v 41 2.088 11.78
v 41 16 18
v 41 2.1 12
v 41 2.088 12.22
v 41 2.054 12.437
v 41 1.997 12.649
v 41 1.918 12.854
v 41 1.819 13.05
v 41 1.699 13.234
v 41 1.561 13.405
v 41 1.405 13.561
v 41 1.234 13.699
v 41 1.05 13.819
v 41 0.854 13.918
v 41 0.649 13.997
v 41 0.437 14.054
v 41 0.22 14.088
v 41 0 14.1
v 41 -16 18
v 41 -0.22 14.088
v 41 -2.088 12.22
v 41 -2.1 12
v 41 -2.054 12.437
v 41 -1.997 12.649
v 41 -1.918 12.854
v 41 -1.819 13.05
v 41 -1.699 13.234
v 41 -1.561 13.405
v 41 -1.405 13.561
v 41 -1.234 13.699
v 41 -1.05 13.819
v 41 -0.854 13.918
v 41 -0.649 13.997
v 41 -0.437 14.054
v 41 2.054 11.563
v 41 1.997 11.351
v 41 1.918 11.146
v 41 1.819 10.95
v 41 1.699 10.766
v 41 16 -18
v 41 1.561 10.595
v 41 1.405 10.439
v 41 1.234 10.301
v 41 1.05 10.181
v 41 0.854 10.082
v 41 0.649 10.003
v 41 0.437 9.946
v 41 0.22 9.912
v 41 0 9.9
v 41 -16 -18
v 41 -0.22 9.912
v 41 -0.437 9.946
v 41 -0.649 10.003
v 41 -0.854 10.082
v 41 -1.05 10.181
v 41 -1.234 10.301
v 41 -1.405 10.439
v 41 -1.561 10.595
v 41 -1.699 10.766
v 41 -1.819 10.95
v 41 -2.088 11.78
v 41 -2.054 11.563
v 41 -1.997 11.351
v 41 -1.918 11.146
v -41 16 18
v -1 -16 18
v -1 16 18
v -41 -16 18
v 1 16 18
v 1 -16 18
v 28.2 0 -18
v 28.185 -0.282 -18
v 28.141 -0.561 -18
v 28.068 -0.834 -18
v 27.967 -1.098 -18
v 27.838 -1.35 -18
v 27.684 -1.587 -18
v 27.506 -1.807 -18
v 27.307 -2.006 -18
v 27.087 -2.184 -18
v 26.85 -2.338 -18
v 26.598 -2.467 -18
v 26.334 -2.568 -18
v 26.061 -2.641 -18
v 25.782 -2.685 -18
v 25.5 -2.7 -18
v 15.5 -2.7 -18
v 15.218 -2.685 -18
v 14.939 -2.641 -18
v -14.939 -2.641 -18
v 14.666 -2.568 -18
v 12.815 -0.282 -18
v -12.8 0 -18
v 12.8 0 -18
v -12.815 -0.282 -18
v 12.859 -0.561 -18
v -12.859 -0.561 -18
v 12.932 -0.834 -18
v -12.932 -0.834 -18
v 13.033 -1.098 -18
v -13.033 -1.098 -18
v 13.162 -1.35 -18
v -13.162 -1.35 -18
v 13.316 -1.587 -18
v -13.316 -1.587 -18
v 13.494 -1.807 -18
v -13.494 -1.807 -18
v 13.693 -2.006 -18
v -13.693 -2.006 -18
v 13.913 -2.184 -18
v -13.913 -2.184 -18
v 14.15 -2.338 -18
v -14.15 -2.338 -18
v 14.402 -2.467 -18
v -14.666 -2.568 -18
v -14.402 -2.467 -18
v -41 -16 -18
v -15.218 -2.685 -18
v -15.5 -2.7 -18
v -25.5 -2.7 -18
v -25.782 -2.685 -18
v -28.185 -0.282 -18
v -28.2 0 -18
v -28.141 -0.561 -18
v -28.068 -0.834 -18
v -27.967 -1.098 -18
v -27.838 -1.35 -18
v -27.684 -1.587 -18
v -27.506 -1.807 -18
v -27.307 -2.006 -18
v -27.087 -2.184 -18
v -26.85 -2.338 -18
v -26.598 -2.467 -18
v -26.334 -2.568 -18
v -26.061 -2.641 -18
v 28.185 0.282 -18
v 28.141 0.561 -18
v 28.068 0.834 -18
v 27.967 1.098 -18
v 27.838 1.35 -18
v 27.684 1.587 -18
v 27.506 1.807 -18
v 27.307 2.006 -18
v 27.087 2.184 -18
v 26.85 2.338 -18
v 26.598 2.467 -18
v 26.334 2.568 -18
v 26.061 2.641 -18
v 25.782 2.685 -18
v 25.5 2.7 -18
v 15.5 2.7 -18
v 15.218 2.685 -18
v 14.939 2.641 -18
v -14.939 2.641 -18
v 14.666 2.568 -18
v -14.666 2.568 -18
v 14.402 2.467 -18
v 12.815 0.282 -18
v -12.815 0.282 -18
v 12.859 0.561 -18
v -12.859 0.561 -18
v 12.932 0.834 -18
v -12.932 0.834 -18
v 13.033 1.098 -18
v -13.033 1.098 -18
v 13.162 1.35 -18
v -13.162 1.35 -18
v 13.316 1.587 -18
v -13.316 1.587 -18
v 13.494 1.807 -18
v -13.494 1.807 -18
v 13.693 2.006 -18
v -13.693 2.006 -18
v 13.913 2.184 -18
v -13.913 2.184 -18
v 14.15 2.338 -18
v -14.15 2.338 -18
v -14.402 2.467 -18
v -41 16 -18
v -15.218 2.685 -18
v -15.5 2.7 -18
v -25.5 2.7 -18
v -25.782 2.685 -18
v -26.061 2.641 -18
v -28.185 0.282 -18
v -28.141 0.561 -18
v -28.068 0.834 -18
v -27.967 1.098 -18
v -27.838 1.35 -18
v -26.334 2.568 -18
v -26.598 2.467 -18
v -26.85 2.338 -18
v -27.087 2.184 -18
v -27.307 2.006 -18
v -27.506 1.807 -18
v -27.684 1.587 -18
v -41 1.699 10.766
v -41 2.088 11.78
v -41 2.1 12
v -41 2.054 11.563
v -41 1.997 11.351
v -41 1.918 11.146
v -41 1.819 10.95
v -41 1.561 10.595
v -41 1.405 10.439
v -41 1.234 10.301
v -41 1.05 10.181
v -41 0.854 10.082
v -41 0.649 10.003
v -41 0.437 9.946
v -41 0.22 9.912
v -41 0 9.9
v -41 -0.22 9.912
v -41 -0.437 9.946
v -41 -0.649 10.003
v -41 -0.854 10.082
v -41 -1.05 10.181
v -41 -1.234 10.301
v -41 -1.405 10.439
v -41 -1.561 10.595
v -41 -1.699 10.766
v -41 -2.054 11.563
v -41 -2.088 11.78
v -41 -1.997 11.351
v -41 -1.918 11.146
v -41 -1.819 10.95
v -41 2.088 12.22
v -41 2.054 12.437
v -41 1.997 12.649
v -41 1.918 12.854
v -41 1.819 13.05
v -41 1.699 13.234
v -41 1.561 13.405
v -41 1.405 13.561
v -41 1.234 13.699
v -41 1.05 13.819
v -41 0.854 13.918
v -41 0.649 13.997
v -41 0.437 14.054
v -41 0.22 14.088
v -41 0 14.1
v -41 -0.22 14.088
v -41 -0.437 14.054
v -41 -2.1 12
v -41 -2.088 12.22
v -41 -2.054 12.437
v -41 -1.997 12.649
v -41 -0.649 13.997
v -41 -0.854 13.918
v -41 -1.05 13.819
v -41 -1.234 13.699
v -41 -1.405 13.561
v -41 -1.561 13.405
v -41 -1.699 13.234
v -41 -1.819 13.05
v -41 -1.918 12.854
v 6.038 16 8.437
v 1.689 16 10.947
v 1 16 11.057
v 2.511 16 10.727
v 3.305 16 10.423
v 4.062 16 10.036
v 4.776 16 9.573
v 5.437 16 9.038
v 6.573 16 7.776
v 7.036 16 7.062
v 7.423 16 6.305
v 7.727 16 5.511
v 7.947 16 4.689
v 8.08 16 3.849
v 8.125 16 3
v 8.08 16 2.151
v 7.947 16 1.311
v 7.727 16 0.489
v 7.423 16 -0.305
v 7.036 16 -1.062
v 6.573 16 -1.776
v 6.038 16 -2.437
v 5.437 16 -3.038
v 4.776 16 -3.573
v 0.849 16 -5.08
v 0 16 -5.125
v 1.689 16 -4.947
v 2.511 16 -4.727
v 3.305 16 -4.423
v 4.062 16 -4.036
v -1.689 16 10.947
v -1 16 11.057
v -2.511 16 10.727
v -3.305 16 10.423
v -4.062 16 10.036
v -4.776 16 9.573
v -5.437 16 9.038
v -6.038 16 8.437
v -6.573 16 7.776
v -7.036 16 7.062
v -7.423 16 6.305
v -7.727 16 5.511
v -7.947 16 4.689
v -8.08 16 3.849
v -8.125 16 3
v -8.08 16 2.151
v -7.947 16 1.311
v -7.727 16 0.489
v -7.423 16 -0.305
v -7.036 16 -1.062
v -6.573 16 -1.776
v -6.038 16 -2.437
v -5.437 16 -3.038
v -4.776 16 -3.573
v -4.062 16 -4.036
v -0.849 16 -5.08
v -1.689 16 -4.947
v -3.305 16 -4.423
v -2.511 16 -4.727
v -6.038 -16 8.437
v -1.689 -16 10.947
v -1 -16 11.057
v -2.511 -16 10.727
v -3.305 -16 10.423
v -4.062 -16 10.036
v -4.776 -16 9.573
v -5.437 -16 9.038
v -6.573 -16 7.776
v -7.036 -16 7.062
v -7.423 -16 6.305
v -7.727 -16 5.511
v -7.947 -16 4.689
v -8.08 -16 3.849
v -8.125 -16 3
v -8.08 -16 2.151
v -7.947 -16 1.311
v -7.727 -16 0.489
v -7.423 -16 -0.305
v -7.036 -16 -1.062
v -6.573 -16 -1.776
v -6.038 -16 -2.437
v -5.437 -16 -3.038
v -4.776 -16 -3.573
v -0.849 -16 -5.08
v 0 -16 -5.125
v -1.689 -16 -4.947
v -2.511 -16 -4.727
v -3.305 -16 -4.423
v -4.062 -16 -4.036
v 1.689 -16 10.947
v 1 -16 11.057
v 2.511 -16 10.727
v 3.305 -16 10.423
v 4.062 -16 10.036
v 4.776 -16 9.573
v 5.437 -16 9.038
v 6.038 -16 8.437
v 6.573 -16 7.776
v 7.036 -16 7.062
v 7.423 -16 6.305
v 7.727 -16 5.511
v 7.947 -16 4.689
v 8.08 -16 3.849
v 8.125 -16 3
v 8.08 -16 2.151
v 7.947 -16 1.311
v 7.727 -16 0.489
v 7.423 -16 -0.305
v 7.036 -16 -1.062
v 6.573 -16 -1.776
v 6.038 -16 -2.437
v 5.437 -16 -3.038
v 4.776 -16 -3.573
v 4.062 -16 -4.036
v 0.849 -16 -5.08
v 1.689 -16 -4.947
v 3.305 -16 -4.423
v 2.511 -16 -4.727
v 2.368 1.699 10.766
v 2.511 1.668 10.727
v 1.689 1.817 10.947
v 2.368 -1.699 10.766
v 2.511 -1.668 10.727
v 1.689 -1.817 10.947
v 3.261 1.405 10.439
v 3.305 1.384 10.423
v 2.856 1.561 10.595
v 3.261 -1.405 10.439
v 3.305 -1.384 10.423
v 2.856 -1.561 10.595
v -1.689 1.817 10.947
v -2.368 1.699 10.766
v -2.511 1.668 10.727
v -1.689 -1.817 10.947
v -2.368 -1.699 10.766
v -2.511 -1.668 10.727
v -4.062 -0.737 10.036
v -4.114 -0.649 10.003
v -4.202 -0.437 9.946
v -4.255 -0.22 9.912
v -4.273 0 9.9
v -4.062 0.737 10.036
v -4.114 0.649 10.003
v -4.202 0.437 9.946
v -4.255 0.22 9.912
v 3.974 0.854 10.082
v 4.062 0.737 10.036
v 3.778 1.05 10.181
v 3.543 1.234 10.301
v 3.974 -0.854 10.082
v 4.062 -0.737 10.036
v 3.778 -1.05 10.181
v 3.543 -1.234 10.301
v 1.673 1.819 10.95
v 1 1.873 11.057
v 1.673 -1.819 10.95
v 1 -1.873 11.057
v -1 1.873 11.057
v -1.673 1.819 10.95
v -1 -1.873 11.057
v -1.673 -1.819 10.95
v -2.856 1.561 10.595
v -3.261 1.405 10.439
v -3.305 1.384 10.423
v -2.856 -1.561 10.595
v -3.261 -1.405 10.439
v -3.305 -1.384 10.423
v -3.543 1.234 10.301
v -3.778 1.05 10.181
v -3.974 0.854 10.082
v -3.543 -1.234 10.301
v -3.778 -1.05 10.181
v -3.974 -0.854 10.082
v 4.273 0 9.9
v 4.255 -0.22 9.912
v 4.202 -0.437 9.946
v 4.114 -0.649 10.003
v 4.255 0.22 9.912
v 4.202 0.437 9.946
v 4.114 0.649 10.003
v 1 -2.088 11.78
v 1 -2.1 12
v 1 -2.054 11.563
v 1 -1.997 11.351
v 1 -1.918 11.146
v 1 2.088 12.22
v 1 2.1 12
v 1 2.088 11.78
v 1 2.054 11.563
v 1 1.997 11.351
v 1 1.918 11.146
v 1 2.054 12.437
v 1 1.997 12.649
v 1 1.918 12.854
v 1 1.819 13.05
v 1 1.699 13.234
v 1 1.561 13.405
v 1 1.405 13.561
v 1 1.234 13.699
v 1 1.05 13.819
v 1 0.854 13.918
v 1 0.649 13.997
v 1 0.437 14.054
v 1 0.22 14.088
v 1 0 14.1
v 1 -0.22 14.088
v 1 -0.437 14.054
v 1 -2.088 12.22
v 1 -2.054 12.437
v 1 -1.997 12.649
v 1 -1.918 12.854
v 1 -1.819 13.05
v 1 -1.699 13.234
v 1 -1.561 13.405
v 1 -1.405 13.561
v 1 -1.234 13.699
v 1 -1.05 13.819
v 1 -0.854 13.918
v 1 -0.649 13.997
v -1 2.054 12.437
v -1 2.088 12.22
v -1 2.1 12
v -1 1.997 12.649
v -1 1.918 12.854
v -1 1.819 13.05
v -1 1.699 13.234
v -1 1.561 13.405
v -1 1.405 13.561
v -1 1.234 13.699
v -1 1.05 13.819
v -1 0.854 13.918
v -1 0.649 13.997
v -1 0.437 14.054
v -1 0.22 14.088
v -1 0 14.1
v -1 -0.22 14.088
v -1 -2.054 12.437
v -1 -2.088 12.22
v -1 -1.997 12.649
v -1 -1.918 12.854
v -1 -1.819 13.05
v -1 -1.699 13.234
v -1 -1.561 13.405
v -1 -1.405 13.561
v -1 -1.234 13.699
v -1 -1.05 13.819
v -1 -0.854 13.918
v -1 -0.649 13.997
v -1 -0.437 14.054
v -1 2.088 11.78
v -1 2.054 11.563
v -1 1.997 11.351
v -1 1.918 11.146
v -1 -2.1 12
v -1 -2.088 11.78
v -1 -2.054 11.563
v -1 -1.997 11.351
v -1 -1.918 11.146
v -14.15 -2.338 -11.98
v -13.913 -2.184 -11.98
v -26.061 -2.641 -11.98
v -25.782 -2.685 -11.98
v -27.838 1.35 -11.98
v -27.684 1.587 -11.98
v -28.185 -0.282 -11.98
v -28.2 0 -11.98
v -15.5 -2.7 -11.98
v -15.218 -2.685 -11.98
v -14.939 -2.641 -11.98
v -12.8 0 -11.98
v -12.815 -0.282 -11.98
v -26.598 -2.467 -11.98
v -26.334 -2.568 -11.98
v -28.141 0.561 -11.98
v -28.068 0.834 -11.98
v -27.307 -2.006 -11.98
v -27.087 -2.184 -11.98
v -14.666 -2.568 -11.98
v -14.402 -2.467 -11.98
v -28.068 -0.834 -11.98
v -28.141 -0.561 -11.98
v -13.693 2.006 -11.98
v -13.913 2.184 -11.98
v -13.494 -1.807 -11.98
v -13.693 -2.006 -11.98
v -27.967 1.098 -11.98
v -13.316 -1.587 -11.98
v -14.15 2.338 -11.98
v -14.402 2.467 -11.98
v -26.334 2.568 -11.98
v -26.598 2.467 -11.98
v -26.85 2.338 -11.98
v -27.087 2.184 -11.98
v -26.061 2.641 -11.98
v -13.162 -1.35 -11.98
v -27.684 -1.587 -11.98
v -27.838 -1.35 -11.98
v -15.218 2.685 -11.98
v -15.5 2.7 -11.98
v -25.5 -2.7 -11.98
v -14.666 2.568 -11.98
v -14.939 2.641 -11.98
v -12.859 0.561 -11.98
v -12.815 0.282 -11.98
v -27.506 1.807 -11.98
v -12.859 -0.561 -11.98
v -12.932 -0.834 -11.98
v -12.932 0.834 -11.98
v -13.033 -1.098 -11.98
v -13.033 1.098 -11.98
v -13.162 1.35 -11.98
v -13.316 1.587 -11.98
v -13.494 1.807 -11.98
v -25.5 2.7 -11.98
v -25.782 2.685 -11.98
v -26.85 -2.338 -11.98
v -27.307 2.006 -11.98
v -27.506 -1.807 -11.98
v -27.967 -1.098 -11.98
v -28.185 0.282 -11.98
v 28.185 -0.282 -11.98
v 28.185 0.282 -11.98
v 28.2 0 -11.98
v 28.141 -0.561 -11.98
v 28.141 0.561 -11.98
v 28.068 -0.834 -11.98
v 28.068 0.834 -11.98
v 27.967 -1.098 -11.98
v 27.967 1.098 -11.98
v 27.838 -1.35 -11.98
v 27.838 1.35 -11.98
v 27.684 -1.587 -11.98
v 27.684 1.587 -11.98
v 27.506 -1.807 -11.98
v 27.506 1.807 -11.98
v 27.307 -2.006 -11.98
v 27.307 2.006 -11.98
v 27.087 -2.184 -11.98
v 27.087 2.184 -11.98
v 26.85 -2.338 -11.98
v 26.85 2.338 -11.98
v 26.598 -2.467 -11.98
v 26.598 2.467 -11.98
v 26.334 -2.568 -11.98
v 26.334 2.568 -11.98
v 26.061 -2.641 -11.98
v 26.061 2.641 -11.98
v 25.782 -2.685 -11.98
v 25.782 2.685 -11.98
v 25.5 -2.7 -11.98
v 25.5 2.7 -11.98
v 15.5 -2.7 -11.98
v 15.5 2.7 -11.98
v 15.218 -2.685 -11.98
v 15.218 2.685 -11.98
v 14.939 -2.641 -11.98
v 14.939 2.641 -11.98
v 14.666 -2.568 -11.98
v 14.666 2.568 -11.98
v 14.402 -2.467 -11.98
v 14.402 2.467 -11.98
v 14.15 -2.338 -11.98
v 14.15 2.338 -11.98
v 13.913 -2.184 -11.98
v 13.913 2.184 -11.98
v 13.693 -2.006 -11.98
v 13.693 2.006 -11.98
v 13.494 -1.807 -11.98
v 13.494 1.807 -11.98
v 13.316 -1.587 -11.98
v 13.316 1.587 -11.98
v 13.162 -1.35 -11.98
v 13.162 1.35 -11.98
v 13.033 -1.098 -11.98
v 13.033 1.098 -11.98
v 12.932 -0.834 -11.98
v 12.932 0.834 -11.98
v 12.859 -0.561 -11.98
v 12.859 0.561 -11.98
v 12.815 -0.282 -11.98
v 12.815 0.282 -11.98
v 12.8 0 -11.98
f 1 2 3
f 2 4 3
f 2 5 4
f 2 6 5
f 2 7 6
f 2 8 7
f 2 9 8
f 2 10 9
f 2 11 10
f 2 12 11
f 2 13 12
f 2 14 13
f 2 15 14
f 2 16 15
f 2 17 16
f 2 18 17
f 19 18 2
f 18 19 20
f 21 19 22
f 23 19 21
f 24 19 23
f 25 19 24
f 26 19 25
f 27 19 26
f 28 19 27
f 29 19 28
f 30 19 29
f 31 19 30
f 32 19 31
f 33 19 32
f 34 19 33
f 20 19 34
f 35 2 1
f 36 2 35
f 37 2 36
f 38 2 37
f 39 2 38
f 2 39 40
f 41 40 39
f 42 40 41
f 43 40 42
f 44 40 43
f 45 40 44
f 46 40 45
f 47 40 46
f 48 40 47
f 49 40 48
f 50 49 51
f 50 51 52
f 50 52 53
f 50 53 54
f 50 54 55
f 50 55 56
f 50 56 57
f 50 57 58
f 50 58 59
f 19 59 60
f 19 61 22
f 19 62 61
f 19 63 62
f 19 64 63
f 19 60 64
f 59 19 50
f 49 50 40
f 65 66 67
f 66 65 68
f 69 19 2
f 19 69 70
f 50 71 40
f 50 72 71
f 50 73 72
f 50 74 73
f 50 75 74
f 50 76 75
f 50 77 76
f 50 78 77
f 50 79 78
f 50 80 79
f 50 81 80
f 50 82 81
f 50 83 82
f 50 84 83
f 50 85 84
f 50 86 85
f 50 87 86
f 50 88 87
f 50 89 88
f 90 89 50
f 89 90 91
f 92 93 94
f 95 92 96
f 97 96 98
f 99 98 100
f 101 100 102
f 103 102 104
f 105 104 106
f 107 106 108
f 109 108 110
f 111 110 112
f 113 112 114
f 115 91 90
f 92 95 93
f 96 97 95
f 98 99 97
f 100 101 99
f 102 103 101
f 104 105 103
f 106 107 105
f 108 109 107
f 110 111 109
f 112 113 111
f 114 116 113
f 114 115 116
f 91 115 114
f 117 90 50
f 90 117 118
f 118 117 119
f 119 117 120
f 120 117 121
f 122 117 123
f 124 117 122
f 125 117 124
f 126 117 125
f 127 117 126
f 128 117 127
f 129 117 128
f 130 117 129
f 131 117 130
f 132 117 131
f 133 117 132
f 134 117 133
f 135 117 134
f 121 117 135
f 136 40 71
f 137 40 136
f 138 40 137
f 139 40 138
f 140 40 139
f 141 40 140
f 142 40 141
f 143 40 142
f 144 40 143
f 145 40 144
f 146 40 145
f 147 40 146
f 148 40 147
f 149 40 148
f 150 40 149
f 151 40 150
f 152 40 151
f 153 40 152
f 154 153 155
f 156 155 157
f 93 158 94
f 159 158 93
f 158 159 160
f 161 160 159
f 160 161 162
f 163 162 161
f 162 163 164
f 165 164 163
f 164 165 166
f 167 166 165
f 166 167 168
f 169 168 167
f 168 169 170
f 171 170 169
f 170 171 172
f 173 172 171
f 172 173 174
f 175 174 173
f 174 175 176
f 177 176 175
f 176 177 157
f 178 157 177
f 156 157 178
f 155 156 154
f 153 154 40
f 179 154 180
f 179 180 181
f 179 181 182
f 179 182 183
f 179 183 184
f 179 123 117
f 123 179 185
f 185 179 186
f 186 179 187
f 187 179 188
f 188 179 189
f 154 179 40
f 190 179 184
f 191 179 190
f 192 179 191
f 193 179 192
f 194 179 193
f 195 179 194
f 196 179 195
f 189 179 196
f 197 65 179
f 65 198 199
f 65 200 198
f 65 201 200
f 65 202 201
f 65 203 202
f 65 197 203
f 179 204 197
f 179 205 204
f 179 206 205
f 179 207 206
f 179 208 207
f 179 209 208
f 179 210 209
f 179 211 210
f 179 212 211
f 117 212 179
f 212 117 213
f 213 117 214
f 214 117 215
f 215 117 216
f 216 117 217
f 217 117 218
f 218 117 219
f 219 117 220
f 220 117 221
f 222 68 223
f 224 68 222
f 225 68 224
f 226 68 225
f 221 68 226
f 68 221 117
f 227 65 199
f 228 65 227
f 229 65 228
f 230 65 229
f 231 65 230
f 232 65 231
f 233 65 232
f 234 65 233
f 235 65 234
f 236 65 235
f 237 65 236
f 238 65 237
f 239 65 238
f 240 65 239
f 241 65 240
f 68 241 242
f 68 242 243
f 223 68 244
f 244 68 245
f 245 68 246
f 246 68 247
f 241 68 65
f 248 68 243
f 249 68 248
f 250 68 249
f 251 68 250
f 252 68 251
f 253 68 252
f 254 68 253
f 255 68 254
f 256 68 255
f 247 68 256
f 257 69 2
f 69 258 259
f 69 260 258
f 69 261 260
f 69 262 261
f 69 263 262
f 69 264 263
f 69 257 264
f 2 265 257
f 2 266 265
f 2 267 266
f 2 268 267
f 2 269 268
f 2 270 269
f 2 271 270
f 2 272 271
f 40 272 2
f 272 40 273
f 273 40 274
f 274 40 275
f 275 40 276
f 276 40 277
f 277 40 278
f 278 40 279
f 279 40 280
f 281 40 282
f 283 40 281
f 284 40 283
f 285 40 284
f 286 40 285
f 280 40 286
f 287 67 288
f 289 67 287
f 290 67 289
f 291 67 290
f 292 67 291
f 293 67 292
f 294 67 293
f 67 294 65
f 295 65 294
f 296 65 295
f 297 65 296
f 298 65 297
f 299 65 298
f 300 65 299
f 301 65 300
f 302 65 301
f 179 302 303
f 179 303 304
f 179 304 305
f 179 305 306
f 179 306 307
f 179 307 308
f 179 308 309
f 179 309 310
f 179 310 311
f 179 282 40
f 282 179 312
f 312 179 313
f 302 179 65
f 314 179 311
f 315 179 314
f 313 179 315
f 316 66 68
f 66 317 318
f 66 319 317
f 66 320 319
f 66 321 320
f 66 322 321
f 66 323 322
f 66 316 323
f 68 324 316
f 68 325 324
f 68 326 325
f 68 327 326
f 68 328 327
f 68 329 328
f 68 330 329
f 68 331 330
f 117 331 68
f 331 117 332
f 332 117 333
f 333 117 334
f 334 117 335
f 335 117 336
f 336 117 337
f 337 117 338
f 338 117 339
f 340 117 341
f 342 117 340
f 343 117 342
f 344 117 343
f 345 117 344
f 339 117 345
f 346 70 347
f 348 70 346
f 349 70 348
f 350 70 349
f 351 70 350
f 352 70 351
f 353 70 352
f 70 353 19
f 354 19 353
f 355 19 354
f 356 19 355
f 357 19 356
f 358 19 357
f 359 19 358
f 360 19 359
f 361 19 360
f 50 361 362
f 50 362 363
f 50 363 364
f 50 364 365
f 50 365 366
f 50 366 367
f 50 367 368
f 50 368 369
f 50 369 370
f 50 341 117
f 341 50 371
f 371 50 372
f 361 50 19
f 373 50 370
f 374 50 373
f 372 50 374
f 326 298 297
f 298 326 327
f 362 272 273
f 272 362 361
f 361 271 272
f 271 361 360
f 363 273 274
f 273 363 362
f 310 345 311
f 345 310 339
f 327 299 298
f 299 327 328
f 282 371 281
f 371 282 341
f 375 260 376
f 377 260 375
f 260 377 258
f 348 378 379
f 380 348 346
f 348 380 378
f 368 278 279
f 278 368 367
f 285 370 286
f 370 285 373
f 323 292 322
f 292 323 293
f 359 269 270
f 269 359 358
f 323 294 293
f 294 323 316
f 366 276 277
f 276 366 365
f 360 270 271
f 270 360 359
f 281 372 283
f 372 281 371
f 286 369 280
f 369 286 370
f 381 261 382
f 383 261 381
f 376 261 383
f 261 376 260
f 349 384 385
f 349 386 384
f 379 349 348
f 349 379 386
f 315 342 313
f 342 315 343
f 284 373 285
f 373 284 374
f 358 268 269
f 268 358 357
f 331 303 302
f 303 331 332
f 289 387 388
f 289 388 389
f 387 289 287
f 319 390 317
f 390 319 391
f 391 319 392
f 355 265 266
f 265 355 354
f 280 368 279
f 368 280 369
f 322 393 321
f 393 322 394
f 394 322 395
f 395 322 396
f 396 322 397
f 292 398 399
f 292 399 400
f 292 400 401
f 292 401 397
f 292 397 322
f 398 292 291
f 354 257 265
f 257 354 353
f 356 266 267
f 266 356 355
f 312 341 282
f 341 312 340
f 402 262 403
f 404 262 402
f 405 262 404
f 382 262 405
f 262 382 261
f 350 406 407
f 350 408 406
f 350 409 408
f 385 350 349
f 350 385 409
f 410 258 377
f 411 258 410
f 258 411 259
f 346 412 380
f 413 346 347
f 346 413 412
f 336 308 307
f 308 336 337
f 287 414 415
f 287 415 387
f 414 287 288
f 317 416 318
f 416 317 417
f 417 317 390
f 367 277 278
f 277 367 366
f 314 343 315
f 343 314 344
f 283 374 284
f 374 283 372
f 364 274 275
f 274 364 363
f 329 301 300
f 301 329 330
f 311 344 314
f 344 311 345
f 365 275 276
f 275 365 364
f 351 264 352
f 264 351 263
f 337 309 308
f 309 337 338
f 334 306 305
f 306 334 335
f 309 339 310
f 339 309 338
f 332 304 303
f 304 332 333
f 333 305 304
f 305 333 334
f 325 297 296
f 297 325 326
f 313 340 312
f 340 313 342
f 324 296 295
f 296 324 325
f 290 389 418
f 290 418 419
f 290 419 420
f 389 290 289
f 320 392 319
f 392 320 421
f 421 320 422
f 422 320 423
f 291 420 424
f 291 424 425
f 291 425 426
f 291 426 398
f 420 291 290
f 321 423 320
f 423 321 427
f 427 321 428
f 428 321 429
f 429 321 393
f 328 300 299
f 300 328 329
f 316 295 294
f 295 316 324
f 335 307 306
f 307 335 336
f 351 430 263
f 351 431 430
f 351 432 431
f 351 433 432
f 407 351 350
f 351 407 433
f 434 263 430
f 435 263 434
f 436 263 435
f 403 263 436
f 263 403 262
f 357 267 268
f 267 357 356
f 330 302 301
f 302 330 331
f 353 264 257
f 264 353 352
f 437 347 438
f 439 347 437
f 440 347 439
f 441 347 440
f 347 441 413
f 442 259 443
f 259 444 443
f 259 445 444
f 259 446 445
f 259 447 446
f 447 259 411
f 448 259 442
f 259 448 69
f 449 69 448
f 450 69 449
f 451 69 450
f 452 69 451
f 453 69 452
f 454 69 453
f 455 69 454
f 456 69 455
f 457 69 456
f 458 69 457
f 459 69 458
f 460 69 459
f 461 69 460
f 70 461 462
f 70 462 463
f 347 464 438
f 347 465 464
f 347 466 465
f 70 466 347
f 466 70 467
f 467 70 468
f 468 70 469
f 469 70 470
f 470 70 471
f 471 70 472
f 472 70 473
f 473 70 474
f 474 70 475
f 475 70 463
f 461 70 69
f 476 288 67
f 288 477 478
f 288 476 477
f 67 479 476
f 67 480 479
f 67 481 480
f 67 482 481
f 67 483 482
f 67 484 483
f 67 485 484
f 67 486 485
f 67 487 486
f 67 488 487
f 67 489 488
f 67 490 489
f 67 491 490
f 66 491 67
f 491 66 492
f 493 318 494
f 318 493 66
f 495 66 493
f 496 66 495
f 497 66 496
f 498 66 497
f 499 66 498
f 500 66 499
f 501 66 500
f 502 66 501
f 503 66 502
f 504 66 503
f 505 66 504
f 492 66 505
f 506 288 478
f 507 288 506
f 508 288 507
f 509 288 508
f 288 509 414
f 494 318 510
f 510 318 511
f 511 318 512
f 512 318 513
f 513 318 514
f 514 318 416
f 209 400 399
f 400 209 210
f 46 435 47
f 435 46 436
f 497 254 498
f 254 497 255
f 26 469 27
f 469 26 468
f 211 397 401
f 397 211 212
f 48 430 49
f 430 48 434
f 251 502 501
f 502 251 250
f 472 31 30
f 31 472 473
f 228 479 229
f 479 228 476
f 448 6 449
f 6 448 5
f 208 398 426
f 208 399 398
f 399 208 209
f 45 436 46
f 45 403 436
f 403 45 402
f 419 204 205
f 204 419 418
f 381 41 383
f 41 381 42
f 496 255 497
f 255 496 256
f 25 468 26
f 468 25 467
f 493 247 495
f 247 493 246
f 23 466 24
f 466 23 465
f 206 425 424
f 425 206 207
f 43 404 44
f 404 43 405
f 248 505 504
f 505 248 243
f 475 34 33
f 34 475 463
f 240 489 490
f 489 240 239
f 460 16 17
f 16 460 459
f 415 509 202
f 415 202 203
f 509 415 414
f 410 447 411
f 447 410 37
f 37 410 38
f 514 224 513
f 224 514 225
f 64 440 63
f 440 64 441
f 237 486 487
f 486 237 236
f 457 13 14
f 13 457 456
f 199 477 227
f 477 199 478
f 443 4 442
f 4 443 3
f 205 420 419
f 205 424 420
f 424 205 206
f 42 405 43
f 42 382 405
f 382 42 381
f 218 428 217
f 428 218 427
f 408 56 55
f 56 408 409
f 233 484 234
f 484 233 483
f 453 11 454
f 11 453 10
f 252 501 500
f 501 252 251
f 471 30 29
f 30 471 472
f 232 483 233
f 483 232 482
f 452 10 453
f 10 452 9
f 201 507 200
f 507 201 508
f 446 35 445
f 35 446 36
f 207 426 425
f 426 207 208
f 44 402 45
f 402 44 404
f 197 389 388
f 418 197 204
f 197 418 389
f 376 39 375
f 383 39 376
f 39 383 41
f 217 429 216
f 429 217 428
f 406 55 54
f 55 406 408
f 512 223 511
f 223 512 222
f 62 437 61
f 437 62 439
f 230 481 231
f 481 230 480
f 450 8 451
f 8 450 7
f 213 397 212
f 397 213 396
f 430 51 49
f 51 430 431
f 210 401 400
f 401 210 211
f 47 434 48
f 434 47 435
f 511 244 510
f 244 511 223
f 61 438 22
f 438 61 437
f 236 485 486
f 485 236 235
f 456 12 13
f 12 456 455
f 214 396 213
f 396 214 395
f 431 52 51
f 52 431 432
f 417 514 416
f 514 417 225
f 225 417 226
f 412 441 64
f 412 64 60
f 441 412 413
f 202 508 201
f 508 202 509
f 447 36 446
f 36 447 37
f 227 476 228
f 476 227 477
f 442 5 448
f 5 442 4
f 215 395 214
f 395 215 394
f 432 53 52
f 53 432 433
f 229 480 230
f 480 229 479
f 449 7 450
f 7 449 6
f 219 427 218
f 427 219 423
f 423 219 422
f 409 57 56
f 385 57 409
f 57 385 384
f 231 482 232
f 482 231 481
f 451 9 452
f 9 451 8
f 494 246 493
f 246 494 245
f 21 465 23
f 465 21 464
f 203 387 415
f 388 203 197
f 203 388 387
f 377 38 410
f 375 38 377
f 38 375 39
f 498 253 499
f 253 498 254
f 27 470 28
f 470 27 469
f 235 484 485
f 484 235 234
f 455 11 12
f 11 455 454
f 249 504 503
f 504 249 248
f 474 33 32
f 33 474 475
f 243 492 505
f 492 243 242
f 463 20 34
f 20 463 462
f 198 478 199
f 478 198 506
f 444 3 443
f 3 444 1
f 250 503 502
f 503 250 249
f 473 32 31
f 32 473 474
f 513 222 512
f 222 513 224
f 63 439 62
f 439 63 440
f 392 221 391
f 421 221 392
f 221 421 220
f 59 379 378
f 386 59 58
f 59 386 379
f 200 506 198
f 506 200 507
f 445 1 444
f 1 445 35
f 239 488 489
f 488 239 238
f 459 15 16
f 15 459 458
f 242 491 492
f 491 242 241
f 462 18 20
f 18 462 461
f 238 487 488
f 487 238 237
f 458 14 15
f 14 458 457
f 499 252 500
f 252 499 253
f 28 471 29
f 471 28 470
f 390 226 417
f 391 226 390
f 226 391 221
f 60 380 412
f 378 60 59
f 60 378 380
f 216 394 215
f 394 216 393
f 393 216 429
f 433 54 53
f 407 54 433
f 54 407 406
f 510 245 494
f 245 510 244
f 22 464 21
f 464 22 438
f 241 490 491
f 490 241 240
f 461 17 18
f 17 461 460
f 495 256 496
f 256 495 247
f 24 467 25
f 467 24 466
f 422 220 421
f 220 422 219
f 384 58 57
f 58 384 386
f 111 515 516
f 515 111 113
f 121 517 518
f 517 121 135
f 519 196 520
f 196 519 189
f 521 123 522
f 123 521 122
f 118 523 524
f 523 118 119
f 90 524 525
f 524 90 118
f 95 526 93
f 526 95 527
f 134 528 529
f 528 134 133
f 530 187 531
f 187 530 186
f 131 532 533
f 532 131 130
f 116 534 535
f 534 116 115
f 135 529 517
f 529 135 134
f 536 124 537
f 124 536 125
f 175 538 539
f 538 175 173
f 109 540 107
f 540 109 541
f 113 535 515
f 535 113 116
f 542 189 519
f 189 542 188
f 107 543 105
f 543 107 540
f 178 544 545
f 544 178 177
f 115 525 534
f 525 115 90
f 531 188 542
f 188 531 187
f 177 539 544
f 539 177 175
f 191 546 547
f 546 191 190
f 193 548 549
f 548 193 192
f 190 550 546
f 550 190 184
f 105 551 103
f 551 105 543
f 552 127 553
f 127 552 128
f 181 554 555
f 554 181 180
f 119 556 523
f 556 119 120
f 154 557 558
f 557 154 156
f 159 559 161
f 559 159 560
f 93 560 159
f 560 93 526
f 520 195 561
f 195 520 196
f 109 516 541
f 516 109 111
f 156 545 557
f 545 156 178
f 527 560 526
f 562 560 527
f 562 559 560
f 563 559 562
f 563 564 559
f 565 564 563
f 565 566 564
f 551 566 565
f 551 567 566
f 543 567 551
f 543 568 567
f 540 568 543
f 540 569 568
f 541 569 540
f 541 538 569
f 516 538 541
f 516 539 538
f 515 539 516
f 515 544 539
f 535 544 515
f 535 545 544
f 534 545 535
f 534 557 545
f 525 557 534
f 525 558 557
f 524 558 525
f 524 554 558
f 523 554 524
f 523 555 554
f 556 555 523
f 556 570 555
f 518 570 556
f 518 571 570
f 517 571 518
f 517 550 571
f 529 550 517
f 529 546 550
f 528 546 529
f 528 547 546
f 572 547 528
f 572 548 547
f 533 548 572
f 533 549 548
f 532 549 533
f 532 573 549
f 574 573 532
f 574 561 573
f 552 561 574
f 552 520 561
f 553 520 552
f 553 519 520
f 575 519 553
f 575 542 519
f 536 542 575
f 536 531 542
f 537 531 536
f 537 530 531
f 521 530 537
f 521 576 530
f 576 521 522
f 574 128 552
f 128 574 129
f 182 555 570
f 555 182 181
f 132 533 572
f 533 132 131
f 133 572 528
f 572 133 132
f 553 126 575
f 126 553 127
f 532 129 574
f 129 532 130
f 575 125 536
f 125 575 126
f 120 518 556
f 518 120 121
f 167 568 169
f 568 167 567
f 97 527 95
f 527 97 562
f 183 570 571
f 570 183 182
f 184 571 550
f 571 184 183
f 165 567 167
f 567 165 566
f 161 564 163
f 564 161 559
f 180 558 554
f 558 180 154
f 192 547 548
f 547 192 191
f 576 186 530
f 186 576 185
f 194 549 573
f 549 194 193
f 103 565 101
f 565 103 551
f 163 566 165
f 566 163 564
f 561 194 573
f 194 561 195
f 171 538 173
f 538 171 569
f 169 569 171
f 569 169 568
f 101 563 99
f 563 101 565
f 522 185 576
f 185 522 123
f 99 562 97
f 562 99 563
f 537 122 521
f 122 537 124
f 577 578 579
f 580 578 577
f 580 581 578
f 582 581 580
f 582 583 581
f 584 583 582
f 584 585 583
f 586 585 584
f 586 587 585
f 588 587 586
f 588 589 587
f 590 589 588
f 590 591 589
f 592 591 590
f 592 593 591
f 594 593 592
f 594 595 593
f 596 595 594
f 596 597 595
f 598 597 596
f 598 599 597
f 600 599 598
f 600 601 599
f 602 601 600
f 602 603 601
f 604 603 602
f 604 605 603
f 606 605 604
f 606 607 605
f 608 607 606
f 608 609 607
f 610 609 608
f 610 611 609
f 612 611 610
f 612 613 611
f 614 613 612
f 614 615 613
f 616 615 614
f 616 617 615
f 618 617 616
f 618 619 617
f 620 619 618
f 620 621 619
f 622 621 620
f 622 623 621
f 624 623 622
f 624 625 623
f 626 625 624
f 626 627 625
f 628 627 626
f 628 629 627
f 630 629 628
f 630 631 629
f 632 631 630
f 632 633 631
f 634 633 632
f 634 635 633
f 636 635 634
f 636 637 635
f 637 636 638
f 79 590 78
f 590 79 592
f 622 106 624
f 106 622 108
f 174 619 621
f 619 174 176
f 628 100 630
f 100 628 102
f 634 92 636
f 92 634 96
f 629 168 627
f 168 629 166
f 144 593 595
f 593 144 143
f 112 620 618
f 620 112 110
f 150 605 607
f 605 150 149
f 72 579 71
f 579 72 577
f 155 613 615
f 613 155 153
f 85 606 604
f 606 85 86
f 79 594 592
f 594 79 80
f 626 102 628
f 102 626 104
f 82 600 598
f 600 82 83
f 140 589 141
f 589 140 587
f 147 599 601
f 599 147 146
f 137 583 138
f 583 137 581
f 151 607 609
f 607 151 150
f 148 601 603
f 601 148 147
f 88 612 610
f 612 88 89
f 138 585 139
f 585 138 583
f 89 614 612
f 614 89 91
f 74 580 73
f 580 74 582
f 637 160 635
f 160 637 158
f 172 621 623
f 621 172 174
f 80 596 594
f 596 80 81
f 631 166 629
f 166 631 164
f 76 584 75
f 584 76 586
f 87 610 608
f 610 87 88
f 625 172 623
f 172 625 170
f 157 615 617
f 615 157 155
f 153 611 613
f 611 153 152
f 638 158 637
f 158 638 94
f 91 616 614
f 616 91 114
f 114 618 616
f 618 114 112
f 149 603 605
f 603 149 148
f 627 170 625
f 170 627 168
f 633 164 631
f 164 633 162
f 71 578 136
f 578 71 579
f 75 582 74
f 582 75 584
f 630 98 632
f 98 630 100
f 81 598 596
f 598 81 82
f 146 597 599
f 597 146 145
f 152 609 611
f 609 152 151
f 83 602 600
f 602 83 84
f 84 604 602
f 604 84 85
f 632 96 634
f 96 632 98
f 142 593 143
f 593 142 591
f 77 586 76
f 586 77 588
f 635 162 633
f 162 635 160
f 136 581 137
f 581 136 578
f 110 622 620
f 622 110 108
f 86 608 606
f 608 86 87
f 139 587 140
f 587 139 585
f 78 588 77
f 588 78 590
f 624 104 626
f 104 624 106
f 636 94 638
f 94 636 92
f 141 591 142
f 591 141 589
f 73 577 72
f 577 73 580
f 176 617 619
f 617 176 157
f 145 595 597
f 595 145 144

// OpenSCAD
// Clamp pedestal for 16 mm shaft.
$fn = 60;
eps = 0.02;
shaft_d = 16;
body_l = 82;
body_d = 32;
body_h = 36;
base_t = 6;
slot_w = 2;
mount_d = 5.4;
module mount_slot(x) {
    hull() {
        translate([x - 5, 0, -body_h / 2 - eps]) cylinder(d = mount_d, h = base_t + 2 * eps);
        translate([x + 5, 0, -body_h / 2 - eps]) cylinder(d = mount_d, h = base_t + 2 * eps);
    }
}
difference() {
    cube([body_l, body_d, body_h], center = true);
    translate([0, -body_d / 2 - eps, 3]) rotate([-90, 0, 0]) cylinder(d = shaft_d + 0.25, h = body_d + 2 * eps);
    translate([-slot_w / 2, -body_d / 2 - eps, 3]) cube([slot_w, body_d + 2 * eps, body_h / 2 + eps]);
    translate([-body_l / 2 - eps, 0, body_h / 2 - 6]) rotate([0, 90, 0]) cylinder(d = 4.2, h = body_l + 2 * eps);
    mount_slot(-body_l / 4);
    mount_slot(body_l / 4);
}
